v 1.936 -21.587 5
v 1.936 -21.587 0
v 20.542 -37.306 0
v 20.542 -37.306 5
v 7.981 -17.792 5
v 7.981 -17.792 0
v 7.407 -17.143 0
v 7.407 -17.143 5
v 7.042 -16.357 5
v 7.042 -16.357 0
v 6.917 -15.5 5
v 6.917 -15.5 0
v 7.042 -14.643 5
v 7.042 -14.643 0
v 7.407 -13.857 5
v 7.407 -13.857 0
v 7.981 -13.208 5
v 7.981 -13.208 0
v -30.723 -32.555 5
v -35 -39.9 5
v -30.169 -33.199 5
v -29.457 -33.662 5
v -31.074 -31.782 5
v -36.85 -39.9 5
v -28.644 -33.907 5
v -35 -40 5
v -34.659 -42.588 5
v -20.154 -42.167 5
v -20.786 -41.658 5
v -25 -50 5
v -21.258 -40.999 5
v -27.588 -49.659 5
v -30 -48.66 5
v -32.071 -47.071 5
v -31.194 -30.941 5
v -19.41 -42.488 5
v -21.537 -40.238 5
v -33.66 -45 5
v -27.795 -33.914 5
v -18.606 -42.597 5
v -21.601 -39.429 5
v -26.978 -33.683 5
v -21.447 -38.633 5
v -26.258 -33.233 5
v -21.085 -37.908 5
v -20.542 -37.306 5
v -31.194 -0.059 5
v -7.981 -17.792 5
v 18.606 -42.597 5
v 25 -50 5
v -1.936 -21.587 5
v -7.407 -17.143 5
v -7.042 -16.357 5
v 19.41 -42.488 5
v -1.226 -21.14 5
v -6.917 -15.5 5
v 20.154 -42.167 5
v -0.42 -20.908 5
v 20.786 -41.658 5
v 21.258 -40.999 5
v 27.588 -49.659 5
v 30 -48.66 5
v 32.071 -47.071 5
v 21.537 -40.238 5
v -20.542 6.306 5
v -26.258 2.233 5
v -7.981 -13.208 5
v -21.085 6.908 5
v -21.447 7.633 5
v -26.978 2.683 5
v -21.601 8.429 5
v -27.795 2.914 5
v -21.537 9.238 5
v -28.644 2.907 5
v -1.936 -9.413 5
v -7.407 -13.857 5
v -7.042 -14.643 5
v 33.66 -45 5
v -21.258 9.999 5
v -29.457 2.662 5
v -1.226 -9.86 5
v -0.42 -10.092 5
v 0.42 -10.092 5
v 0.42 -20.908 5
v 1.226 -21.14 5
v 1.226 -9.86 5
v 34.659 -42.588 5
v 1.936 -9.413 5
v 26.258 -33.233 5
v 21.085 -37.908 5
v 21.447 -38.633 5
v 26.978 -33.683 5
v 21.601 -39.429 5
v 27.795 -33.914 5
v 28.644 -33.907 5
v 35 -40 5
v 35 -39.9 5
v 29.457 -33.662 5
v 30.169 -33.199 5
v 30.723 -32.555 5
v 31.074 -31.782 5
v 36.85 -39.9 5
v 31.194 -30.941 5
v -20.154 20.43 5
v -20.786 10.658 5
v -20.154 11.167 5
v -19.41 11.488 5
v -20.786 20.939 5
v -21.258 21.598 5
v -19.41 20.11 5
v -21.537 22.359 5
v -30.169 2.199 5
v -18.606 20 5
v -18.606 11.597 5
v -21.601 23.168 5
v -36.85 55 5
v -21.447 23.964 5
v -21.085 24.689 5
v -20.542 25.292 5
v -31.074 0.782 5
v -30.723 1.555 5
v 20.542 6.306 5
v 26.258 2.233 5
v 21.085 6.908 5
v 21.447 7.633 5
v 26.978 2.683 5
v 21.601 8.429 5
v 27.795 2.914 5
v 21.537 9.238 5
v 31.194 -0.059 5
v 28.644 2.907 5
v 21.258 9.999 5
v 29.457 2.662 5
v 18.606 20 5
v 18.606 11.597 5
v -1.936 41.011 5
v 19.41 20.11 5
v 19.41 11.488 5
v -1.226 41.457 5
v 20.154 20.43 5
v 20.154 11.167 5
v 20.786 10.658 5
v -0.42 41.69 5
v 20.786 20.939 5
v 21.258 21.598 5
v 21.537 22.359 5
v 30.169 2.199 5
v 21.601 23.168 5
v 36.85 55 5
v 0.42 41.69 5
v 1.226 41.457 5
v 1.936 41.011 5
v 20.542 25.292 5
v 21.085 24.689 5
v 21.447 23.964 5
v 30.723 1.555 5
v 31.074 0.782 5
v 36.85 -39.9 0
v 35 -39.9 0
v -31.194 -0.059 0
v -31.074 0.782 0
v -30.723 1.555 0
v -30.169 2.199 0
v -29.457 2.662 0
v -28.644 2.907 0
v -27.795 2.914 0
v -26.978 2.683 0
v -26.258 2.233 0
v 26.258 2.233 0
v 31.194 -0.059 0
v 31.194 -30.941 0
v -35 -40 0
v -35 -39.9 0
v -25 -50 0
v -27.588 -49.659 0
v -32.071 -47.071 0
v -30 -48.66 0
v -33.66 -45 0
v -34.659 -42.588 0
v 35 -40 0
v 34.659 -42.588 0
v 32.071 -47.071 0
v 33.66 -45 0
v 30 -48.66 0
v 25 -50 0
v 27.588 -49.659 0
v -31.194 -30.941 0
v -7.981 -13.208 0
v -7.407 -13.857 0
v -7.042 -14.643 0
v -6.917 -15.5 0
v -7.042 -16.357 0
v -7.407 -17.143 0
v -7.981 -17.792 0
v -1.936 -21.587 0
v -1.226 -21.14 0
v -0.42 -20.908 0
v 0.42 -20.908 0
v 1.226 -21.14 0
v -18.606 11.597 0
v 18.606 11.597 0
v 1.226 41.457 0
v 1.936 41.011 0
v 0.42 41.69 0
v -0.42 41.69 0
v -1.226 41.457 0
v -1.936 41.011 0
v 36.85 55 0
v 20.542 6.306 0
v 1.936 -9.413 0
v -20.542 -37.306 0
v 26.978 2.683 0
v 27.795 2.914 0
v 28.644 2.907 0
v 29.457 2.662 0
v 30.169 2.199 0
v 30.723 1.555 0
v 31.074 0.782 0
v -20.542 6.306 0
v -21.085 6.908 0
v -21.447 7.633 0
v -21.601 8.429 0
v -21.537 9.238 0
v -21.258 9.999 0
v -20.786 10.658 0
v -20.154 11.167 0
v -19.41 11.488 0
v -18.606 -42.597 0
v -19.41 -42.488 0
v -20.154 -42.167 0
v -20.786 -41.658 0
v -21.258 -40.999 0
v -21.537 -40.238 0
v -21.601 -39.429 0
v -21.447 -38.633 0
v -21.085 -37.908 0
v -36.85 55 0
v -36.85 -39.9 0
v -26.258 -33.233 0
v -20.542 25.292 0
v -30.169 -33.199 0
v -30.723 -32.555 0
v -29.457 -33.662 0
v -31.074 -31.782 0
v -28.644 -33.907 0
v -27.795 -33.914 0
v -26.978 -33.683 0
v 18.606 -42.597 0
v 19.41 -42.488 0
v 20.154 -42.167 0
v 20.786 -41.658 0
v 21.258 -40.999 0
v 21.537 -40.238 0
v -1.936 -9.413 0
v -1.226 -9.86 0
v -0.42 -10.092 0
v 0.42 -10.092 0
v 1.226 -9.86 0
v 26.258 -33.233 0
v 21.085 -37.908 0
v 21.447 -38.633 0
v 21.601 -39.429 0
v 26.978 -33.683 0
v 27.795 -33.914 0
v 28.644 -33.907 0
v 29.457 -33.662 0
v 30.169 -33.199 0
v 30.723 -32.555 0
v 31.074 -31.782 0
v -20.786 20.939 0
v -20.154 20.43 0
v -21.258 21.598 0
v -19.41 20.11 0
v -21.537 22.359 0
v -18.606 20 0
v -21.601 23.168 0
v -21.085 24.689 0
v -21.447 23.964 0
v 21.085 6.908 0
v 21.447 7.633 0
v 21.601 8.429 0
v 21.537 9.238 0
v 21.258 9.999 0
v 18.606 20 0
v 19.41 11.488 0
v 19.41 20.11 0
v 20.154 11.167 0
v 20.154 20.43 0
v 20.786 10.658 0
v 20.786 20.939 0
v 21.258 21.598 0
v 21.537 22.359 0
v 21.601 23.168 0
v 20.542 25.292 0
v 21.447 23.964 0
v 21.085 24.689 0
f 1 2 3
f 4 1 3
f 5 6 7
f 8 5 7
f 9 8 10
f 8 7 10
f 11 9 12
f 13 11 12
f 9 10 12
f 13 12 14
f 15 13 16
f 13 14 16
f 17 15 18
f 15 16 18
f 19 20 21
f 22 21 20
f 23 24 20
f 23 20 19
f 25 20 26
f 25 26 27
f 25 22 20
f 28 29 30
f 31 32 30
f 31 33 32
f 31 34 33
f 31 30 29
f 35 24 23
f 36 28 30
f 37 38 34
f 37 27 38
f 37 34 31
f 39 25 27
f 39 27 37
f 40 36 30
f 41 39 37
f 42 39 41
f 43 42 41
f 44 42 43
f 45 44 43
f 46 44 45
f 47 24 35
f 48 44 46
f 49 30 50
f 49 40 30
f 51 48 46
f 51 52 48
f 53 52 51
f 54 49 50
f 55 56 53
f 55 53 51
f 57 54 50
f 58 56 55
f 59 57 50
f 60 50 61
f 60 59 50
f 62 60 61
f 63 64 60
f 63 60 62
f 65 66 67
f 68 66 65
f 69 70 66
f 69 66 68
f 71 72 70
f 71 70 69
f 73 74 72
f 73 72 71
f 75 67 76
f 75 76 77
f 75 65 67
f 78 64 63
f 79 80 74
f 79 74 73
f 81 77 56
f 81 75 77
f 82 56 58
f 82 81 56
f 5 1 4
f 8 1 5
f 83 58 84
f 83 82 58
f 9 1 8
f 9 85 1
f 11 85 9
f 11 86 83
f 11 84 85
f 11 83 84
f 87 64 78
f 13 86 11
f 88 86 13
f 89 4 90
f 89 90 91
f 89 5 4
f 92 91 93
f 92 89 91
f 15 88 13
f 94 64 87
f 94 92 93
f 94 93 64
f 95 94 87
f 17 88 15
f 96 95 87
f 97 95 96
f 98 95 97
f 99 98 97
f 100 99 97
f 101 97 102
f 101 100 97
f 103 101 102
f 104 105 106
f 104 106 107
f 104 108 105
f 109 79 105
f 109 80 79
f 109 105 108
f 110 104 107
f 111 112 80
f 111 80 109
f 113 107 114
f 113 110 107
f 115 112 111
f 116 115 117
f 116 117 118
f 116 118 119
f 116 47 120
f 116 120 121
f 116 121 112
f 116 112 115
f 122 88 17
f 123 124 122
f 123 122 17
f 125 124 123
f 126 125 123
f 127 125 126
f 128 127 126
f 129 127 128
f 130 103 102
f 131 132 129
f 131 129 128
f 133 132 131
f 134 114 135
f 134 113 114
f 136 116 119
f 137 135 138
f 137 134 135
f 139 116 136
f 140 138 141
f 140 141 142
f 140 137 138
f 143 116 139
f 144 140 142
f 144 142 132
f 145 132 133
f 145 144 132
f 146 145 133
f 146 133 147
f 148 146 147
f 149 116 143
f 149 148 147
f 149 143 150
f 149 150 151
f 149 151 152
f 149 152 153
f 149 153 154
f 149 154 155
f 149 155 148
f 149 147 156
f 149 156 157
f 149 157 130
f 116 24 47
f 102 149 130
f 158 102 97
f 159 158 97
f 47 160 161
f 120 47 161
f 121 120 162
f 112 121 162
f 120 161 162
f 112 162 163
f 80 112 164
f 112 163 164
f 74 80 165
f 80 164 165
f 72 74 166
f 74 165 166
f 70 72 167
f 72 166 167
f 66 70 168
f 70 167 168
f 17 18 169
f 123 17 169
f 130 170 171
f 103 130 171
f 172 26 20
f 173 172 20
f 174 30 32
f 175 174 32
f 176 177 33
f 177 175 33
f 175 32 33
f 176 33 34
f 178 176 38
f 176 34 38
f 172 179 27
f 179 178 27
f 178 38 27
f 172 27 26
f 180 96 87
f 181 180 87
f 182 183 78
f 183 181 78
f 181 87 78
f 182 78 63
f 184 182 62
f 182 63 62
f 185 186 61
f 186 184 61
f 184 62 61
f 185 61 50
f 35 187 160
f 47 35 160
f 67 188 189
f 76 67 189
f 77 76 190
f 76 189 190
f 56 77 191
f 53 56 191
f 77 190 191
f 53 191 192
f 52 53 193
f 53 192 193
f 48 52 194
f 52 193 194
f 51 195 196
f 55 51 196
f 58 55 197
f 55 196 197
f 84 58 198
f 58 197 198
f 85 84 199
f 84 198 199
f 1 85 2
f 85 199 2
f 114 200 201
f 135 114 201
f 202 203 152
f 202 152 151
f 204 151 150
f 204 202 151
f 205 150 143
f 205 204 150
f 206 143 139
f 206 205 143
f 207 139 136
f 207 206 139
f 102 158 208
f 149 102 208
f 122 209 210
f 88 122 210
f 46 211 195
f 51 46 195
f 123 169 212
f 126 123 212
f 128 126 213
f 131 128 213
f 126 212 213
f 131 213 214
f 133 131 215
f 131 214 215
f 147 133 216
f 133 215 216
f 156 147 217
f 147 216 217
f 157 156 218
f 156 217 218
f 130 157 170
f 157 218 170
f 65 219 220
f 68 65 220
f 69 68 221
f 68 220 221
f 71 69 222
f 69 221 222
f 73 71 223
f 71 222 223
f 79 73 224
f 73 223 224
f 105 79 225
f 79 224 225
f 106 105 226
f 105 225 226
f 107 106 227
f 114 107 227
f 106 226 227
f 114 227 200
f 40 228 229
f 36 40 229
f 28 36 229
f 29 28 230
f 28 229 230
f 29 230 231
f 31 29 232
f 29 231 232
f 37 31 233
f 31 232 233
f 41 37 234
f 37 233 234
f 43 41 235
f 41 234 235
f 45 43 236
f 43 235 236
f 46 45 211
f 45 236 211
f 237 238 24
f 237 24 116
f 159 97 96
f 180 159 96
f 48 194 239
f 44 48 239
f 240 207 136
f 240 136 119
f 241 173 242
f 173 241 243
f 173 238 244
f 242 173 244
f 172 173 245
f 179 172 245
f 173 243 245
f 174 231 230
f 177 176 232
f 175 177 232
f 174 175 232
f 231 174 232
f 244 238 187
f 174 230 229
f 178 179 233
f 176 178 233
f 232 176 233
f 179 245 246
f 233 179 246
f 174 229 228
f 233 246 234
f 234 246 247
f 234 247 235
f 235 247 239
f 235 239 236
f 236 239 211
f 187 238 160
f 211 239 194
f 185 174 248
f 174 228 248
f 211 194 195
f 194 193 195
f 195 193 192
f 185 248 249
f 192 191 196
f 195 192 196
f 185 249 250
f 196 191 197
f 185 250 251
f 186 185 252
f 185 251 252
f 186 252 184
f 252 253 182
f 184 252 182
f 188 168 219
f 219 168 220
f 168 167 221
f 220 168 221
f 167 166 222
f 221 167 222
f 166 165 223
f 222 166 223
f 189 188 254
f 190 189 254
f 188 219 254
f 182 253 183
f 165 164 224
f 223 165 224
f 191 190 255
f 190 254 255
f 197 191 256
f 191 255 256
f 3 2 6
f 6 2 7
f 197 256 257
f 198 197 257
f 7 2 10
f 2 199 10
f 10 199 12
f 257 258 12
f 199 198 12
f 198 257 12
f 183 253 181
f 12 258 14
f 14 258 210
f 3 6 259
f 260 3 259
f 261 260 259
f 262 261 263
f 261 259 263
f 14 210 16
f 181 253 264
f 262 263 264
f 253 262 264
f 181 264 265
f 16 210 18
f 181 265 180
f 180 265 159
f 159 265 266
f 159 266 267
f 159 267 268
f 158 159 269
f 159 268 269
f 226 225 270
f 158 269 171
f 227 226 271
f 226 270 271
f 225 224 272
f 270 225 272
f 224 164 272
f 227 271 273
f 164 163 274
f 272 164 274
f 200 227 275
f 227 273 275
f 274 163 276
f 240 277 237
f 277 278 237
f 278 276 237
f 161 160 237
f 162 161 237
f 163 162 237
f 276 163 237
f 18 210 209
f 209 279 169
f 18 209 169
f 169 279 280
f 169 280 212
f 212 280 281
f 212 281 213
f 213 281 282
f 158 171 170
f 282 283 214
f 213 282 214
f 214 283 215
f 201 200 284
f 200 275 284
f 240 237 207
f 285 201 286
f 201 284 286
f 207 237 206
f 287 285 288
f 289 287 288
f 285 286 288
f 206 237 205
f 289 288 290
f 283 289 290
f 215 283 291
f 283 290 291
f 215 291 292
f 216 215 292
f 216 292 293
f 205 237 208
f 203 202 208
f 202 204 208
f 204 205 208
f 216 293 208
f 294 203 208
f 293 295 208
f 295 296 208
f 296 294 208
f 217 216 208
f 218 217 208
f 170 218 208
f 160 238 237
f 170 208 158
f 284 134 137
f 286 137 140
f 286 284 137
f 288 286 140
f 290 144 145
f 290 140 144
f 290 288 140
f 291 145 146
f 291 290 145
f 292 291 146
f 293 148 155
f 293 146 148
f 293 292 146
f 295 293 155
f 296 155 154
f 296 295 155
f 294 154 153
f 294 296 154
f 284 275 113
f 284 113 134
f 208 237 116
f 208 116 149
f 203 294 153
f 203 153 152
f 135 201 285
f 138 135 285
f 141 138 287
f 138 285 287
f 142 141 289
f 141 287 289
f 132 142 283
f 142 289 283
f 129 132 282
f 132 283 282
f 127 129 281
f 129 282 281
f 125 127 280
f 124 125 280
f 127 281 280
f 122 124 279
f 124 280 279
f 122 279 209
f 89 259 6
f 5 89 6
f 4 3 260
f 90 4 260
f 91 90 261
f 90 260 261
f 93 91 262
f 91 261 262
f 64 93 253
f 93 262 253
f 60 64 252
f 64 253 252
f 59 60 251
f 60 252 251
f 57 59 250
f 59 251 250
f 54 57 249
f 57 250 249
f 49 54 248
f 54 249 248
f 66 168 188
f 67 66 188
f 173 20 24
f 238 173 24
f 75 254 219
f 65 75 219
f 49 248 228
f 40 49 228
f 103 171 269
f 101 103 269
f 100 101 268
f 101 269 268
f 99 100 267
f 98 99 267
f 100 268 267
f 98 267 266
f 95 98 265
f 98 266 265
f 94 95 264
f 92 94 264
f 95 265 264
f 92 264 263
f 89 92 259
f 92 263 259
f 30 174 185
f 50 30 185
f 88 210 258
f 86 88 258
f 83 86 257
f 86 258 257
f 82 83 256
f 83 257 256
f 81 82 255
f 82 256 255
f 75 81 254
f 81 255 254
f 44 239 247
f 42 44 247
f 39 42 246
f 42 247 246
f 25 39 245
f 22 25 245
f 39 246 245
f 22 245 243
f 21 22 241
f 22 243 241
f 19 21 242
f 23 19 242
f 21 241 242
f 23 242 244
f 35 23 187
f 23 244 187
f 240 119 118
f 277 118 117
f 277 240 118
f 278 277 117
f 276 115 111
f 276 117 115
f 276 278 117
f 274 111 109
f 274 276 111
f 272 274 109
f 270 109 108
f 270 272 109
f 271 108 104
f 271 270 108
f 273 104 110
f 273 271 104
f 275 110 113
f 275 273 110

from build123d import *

# Parameters (mm, degrees)
SKETCH1_W           = 73.7
SKETCH1_H           = 105
BOSS_EXTRUDE1_DEPTH = 5
CUT_EXTRUDE1_REACH  = 68.392
CUT_EXTRUDE2_DEPTH  = 67.39218704


with BuildPart() as part:
    # Sketch1 → Boss-Extrude1 (new body)
    with BuildSketch(Plane.XY):
        with Locations((0, 2.5)):
            Rectangle(SKETCH1_W, SKETCH1_H)
    extrude(amount=BOSS_EXTRUDE1_DEPTH)

    # Sketch2 → Cut-Extrude1 (cut, up to next)
    with BuildSketch(Plane(origin=(0, 0, 0), x_dir=(-1, 0, 0), z_dir=(0, 0, -1)), mode=Mode.PRIVATE) as cut_extrude1_sk1:
        with BuildLine():
            Line((-18.606155591, -42.597211127), (18.606155591, -42.597211127))
            ThreePointArc((18.606155591, -42.597211127), (21.423509903, -40.627994657), (20.542210539, -37.30555425))
            Line((20.542210539, -37.30555425), (1.936054948, -21.586560733))
            ThreePointArc((1.936054948, -21.586560733), (0, -20.87821761), (-1.936054948, -21.586560733))
            Line((-1.936054948, -21.586560733), (-20.542210539, -37.30555425))
            ThreePointArc((-20.542210539, -37.30555425), (-21.423509903, -40.627994657), (-18.606155591, -42.597211127))
        make_face()
    cut_extrude1_tool1 = extrude(cut_extrude1_sk1.sketch, amount=-CUT_EXTRUDE1_REACH, mode=Mode.PRIVATE) & part.part
    # Sketch2 → Cut-Extrude1 (cut, up to next)
    with BuildSketch(Plane(origin=(0, 0, 0), x_dir=(-1, 0, 0), z_dir=(0, 0, -1)), mode=Mode.PRIVATE) as cut_extrude1_sk2:
        with BuildLine():
            Line((7.981018958, -17.791656877), (26.25814066, -33.232673486))
            ThreePointArc((26.25814066, -33.232673486), (29.457491922, -33.662060972), (31.194195607, -30.94101661))
            Line((31.194195607, -30.94101661), (31.194195607, -0.05898339))
            ThreePointArc((31.194195607, -0.05898339), (29.457491922, 2.662060972), (26.25814066, 2.232673486))
            Line((26.25814066, 2.232673486), (7.981018958, -13.208343123))
            ThreePointArc((7.981018958, -13.208343123), (6.917073906, -15.5), (7.981018958, -17.791656877))
        make_face()
    cut_extrude1_tool2 = extrude(cut_extrude1_sk2.sketch, amount=-CUT_EXTRUDE1_REACH, mode=Mode.PRIVATE) & part.part
    # Sketch2 → Cut-Extrude1 (cut, up to next)
    with BuildSketch(Plane(origin=(0, 0, 0), x_dir=(-1, 0, 0), z_dir=(0, 0, -1)), mode=Mode.PRIVATE) as cut_extrude1_sk3:
        with BuildLine():
            Line((-31.194195607, -0.05898339), (-31.194195607, -30.94101661))
            ThreePointArc((-31.194195607, -30.94101661), (-29.457491922, -33.662060972), (-26.25814066, -33.232673486))
            Line((-26.25814066, -33.232673486), (-7.981018958, -17.791656877))
            ThreePointArc((-7.981018958, -17.791656877), (-6.917073906, -15.5), (-7.981018958, -13.208343123))
            Line((-7.981018958, -13.208343123), (-26.25814066, 2.232673486))
            ThreePointArc((-26.25814066, 2.232673486), (-29.457491922, 2.662060972), (-31.194195607, -0.05898339))
        make_face()
    cut_extrude1_tool3 = extrude(cut_extrude1_sk3.sketch, amount=-CUT_EXTRUDE1_REACH, mode=Mode.PRIVATE) & part.part
    # Sketch2 → Cut-Extrude1 (cut, up to next)
    with BuildSketch(Plane(origin=(0, 0, 0), x_dir=(-1, 0, 0), z_dir=(0, 0, -1)), mode=Mode.PRIVATE) as cut_extrude1_sk4:
        with BuildLine():
            Line((18.606155591, 11.597211127), (-18.606155591, 11.597211127))
            ThreePointArc((-18.606155591, 11.597211127), (-21.423509903, 9.627994657), (-20.542210539, 6.30555425))
            Line((-20.542210539, 6.30555425), (-1.936054948, -9.413439267))
            ThreePointArc((-1.936054948, -9.413439267), (0, -10.12178239), (1.936054948, -9.413439267))
            Line((1.936054948, -9.413439267), (20.542210539, 6.30555425))
            ThreePointArc((20.542210539, 6.30555425), (21.423509903, 9.627994657), (18.606155591, 11.597211127))
        make_face()
    cut_extrude1_tool4 = extrude(cut_extrude1_sk4.sketch, amount=-CUT_EXTRUDE1_REACH, mode=Mode.PRIVATE) & part.part
    # Sketch2 → Cut-Extrude1 (cut, up to next)
    with BuildSketch(Plane(origin=(0, 0, 0), x_dir=(-1, 0, 0), z_dir=(0, 0, -1)), mode=Mode.PRIVATE) as cut_extrude1_sk5:
        with BuildLine():
            Line((18.606155591, 20), (-18.606155591, 20))
            ThreePointArc((-18.606155591, 20), (-21.423509903, 21.96921647), (-20.542210539, 25.291656877))
            Line((-20.542210539, 25.291656877), (-1.936054948, 41.010650393))
            ThreePointArc((-1.936054948, 41.010650393), (0, 41.718993517), (1.936054948, 41.010650393))
            Line((1.936054948, 41.010650393), (20.542210539, 25.291656877))
            ThreePointArc((20.542210539, 25.291656877), (21.423509903, 21.96921647), (18.606155591, 20))
        make_face()
    cut_extrude1_tool5 = extrude(cut_extrude1_sk5.sketch, amount=-CUT_EXTRUDE1_REACH, mode=Mode.PRIVATE) & part.part
    add(cut_extrude1_tool1.solids().sort_by_distance((0, -34.791369, 0))[0], mode=Mode.SUBTRACT)
    add(cut_extrude1_tool2.solids().sort_by_distance((-22.387881, -15.5, 0))[0], mode=Mode.SUBTRACT)
    add(cut_extrude1_tool3.solids().sort_by_distance((22.387881, -15.5, 0))[0], mode=Mode.SUBTRACT)
    add(cut_extrude1_tool4.solids().sort_by_distance((0, 3.791369, 0))[0], mode=Mode.SUBTRACT)
    add(cut_extrude1_tool5.solids().sort_by_distance((0, 27.805842, 0))[0], mode=Mode.SUBTRACT)

    # Sketch7 → Cut-Extrude2 (cut, through all)
    with BuildSketch(Plane.XY.offset(5)):
        with BuildLine():
            Line((-36.85, -39.9), (-36.85, -50))
            Line((-36.85, -50), (-25, -50))
            ThreePointArc((-25, -50), (-32.071067812, -47.071067812), (-35, -40))
            Line((-35, -40), (-35, -39.9))
            Line((-35, -39.9), (-36.85, -39.9))
        make_face()
        with BuildLine():
            ThreePointArc((35, -40), (32.071067812, -47.071067812), (25, -50))
            Line((25, -50), (36.85, -50))
            Line((36.85, -50), (36.85, -39.9))
            Line((36.85, -39.9), (35, -39.9))
            Line((35, -39.9), (35, -40))
        make_face()
    extrude(amount=-CUT_EXTRUDE2_DEPTH, mode=Mode.SUBTRACT)


solid = part.part
